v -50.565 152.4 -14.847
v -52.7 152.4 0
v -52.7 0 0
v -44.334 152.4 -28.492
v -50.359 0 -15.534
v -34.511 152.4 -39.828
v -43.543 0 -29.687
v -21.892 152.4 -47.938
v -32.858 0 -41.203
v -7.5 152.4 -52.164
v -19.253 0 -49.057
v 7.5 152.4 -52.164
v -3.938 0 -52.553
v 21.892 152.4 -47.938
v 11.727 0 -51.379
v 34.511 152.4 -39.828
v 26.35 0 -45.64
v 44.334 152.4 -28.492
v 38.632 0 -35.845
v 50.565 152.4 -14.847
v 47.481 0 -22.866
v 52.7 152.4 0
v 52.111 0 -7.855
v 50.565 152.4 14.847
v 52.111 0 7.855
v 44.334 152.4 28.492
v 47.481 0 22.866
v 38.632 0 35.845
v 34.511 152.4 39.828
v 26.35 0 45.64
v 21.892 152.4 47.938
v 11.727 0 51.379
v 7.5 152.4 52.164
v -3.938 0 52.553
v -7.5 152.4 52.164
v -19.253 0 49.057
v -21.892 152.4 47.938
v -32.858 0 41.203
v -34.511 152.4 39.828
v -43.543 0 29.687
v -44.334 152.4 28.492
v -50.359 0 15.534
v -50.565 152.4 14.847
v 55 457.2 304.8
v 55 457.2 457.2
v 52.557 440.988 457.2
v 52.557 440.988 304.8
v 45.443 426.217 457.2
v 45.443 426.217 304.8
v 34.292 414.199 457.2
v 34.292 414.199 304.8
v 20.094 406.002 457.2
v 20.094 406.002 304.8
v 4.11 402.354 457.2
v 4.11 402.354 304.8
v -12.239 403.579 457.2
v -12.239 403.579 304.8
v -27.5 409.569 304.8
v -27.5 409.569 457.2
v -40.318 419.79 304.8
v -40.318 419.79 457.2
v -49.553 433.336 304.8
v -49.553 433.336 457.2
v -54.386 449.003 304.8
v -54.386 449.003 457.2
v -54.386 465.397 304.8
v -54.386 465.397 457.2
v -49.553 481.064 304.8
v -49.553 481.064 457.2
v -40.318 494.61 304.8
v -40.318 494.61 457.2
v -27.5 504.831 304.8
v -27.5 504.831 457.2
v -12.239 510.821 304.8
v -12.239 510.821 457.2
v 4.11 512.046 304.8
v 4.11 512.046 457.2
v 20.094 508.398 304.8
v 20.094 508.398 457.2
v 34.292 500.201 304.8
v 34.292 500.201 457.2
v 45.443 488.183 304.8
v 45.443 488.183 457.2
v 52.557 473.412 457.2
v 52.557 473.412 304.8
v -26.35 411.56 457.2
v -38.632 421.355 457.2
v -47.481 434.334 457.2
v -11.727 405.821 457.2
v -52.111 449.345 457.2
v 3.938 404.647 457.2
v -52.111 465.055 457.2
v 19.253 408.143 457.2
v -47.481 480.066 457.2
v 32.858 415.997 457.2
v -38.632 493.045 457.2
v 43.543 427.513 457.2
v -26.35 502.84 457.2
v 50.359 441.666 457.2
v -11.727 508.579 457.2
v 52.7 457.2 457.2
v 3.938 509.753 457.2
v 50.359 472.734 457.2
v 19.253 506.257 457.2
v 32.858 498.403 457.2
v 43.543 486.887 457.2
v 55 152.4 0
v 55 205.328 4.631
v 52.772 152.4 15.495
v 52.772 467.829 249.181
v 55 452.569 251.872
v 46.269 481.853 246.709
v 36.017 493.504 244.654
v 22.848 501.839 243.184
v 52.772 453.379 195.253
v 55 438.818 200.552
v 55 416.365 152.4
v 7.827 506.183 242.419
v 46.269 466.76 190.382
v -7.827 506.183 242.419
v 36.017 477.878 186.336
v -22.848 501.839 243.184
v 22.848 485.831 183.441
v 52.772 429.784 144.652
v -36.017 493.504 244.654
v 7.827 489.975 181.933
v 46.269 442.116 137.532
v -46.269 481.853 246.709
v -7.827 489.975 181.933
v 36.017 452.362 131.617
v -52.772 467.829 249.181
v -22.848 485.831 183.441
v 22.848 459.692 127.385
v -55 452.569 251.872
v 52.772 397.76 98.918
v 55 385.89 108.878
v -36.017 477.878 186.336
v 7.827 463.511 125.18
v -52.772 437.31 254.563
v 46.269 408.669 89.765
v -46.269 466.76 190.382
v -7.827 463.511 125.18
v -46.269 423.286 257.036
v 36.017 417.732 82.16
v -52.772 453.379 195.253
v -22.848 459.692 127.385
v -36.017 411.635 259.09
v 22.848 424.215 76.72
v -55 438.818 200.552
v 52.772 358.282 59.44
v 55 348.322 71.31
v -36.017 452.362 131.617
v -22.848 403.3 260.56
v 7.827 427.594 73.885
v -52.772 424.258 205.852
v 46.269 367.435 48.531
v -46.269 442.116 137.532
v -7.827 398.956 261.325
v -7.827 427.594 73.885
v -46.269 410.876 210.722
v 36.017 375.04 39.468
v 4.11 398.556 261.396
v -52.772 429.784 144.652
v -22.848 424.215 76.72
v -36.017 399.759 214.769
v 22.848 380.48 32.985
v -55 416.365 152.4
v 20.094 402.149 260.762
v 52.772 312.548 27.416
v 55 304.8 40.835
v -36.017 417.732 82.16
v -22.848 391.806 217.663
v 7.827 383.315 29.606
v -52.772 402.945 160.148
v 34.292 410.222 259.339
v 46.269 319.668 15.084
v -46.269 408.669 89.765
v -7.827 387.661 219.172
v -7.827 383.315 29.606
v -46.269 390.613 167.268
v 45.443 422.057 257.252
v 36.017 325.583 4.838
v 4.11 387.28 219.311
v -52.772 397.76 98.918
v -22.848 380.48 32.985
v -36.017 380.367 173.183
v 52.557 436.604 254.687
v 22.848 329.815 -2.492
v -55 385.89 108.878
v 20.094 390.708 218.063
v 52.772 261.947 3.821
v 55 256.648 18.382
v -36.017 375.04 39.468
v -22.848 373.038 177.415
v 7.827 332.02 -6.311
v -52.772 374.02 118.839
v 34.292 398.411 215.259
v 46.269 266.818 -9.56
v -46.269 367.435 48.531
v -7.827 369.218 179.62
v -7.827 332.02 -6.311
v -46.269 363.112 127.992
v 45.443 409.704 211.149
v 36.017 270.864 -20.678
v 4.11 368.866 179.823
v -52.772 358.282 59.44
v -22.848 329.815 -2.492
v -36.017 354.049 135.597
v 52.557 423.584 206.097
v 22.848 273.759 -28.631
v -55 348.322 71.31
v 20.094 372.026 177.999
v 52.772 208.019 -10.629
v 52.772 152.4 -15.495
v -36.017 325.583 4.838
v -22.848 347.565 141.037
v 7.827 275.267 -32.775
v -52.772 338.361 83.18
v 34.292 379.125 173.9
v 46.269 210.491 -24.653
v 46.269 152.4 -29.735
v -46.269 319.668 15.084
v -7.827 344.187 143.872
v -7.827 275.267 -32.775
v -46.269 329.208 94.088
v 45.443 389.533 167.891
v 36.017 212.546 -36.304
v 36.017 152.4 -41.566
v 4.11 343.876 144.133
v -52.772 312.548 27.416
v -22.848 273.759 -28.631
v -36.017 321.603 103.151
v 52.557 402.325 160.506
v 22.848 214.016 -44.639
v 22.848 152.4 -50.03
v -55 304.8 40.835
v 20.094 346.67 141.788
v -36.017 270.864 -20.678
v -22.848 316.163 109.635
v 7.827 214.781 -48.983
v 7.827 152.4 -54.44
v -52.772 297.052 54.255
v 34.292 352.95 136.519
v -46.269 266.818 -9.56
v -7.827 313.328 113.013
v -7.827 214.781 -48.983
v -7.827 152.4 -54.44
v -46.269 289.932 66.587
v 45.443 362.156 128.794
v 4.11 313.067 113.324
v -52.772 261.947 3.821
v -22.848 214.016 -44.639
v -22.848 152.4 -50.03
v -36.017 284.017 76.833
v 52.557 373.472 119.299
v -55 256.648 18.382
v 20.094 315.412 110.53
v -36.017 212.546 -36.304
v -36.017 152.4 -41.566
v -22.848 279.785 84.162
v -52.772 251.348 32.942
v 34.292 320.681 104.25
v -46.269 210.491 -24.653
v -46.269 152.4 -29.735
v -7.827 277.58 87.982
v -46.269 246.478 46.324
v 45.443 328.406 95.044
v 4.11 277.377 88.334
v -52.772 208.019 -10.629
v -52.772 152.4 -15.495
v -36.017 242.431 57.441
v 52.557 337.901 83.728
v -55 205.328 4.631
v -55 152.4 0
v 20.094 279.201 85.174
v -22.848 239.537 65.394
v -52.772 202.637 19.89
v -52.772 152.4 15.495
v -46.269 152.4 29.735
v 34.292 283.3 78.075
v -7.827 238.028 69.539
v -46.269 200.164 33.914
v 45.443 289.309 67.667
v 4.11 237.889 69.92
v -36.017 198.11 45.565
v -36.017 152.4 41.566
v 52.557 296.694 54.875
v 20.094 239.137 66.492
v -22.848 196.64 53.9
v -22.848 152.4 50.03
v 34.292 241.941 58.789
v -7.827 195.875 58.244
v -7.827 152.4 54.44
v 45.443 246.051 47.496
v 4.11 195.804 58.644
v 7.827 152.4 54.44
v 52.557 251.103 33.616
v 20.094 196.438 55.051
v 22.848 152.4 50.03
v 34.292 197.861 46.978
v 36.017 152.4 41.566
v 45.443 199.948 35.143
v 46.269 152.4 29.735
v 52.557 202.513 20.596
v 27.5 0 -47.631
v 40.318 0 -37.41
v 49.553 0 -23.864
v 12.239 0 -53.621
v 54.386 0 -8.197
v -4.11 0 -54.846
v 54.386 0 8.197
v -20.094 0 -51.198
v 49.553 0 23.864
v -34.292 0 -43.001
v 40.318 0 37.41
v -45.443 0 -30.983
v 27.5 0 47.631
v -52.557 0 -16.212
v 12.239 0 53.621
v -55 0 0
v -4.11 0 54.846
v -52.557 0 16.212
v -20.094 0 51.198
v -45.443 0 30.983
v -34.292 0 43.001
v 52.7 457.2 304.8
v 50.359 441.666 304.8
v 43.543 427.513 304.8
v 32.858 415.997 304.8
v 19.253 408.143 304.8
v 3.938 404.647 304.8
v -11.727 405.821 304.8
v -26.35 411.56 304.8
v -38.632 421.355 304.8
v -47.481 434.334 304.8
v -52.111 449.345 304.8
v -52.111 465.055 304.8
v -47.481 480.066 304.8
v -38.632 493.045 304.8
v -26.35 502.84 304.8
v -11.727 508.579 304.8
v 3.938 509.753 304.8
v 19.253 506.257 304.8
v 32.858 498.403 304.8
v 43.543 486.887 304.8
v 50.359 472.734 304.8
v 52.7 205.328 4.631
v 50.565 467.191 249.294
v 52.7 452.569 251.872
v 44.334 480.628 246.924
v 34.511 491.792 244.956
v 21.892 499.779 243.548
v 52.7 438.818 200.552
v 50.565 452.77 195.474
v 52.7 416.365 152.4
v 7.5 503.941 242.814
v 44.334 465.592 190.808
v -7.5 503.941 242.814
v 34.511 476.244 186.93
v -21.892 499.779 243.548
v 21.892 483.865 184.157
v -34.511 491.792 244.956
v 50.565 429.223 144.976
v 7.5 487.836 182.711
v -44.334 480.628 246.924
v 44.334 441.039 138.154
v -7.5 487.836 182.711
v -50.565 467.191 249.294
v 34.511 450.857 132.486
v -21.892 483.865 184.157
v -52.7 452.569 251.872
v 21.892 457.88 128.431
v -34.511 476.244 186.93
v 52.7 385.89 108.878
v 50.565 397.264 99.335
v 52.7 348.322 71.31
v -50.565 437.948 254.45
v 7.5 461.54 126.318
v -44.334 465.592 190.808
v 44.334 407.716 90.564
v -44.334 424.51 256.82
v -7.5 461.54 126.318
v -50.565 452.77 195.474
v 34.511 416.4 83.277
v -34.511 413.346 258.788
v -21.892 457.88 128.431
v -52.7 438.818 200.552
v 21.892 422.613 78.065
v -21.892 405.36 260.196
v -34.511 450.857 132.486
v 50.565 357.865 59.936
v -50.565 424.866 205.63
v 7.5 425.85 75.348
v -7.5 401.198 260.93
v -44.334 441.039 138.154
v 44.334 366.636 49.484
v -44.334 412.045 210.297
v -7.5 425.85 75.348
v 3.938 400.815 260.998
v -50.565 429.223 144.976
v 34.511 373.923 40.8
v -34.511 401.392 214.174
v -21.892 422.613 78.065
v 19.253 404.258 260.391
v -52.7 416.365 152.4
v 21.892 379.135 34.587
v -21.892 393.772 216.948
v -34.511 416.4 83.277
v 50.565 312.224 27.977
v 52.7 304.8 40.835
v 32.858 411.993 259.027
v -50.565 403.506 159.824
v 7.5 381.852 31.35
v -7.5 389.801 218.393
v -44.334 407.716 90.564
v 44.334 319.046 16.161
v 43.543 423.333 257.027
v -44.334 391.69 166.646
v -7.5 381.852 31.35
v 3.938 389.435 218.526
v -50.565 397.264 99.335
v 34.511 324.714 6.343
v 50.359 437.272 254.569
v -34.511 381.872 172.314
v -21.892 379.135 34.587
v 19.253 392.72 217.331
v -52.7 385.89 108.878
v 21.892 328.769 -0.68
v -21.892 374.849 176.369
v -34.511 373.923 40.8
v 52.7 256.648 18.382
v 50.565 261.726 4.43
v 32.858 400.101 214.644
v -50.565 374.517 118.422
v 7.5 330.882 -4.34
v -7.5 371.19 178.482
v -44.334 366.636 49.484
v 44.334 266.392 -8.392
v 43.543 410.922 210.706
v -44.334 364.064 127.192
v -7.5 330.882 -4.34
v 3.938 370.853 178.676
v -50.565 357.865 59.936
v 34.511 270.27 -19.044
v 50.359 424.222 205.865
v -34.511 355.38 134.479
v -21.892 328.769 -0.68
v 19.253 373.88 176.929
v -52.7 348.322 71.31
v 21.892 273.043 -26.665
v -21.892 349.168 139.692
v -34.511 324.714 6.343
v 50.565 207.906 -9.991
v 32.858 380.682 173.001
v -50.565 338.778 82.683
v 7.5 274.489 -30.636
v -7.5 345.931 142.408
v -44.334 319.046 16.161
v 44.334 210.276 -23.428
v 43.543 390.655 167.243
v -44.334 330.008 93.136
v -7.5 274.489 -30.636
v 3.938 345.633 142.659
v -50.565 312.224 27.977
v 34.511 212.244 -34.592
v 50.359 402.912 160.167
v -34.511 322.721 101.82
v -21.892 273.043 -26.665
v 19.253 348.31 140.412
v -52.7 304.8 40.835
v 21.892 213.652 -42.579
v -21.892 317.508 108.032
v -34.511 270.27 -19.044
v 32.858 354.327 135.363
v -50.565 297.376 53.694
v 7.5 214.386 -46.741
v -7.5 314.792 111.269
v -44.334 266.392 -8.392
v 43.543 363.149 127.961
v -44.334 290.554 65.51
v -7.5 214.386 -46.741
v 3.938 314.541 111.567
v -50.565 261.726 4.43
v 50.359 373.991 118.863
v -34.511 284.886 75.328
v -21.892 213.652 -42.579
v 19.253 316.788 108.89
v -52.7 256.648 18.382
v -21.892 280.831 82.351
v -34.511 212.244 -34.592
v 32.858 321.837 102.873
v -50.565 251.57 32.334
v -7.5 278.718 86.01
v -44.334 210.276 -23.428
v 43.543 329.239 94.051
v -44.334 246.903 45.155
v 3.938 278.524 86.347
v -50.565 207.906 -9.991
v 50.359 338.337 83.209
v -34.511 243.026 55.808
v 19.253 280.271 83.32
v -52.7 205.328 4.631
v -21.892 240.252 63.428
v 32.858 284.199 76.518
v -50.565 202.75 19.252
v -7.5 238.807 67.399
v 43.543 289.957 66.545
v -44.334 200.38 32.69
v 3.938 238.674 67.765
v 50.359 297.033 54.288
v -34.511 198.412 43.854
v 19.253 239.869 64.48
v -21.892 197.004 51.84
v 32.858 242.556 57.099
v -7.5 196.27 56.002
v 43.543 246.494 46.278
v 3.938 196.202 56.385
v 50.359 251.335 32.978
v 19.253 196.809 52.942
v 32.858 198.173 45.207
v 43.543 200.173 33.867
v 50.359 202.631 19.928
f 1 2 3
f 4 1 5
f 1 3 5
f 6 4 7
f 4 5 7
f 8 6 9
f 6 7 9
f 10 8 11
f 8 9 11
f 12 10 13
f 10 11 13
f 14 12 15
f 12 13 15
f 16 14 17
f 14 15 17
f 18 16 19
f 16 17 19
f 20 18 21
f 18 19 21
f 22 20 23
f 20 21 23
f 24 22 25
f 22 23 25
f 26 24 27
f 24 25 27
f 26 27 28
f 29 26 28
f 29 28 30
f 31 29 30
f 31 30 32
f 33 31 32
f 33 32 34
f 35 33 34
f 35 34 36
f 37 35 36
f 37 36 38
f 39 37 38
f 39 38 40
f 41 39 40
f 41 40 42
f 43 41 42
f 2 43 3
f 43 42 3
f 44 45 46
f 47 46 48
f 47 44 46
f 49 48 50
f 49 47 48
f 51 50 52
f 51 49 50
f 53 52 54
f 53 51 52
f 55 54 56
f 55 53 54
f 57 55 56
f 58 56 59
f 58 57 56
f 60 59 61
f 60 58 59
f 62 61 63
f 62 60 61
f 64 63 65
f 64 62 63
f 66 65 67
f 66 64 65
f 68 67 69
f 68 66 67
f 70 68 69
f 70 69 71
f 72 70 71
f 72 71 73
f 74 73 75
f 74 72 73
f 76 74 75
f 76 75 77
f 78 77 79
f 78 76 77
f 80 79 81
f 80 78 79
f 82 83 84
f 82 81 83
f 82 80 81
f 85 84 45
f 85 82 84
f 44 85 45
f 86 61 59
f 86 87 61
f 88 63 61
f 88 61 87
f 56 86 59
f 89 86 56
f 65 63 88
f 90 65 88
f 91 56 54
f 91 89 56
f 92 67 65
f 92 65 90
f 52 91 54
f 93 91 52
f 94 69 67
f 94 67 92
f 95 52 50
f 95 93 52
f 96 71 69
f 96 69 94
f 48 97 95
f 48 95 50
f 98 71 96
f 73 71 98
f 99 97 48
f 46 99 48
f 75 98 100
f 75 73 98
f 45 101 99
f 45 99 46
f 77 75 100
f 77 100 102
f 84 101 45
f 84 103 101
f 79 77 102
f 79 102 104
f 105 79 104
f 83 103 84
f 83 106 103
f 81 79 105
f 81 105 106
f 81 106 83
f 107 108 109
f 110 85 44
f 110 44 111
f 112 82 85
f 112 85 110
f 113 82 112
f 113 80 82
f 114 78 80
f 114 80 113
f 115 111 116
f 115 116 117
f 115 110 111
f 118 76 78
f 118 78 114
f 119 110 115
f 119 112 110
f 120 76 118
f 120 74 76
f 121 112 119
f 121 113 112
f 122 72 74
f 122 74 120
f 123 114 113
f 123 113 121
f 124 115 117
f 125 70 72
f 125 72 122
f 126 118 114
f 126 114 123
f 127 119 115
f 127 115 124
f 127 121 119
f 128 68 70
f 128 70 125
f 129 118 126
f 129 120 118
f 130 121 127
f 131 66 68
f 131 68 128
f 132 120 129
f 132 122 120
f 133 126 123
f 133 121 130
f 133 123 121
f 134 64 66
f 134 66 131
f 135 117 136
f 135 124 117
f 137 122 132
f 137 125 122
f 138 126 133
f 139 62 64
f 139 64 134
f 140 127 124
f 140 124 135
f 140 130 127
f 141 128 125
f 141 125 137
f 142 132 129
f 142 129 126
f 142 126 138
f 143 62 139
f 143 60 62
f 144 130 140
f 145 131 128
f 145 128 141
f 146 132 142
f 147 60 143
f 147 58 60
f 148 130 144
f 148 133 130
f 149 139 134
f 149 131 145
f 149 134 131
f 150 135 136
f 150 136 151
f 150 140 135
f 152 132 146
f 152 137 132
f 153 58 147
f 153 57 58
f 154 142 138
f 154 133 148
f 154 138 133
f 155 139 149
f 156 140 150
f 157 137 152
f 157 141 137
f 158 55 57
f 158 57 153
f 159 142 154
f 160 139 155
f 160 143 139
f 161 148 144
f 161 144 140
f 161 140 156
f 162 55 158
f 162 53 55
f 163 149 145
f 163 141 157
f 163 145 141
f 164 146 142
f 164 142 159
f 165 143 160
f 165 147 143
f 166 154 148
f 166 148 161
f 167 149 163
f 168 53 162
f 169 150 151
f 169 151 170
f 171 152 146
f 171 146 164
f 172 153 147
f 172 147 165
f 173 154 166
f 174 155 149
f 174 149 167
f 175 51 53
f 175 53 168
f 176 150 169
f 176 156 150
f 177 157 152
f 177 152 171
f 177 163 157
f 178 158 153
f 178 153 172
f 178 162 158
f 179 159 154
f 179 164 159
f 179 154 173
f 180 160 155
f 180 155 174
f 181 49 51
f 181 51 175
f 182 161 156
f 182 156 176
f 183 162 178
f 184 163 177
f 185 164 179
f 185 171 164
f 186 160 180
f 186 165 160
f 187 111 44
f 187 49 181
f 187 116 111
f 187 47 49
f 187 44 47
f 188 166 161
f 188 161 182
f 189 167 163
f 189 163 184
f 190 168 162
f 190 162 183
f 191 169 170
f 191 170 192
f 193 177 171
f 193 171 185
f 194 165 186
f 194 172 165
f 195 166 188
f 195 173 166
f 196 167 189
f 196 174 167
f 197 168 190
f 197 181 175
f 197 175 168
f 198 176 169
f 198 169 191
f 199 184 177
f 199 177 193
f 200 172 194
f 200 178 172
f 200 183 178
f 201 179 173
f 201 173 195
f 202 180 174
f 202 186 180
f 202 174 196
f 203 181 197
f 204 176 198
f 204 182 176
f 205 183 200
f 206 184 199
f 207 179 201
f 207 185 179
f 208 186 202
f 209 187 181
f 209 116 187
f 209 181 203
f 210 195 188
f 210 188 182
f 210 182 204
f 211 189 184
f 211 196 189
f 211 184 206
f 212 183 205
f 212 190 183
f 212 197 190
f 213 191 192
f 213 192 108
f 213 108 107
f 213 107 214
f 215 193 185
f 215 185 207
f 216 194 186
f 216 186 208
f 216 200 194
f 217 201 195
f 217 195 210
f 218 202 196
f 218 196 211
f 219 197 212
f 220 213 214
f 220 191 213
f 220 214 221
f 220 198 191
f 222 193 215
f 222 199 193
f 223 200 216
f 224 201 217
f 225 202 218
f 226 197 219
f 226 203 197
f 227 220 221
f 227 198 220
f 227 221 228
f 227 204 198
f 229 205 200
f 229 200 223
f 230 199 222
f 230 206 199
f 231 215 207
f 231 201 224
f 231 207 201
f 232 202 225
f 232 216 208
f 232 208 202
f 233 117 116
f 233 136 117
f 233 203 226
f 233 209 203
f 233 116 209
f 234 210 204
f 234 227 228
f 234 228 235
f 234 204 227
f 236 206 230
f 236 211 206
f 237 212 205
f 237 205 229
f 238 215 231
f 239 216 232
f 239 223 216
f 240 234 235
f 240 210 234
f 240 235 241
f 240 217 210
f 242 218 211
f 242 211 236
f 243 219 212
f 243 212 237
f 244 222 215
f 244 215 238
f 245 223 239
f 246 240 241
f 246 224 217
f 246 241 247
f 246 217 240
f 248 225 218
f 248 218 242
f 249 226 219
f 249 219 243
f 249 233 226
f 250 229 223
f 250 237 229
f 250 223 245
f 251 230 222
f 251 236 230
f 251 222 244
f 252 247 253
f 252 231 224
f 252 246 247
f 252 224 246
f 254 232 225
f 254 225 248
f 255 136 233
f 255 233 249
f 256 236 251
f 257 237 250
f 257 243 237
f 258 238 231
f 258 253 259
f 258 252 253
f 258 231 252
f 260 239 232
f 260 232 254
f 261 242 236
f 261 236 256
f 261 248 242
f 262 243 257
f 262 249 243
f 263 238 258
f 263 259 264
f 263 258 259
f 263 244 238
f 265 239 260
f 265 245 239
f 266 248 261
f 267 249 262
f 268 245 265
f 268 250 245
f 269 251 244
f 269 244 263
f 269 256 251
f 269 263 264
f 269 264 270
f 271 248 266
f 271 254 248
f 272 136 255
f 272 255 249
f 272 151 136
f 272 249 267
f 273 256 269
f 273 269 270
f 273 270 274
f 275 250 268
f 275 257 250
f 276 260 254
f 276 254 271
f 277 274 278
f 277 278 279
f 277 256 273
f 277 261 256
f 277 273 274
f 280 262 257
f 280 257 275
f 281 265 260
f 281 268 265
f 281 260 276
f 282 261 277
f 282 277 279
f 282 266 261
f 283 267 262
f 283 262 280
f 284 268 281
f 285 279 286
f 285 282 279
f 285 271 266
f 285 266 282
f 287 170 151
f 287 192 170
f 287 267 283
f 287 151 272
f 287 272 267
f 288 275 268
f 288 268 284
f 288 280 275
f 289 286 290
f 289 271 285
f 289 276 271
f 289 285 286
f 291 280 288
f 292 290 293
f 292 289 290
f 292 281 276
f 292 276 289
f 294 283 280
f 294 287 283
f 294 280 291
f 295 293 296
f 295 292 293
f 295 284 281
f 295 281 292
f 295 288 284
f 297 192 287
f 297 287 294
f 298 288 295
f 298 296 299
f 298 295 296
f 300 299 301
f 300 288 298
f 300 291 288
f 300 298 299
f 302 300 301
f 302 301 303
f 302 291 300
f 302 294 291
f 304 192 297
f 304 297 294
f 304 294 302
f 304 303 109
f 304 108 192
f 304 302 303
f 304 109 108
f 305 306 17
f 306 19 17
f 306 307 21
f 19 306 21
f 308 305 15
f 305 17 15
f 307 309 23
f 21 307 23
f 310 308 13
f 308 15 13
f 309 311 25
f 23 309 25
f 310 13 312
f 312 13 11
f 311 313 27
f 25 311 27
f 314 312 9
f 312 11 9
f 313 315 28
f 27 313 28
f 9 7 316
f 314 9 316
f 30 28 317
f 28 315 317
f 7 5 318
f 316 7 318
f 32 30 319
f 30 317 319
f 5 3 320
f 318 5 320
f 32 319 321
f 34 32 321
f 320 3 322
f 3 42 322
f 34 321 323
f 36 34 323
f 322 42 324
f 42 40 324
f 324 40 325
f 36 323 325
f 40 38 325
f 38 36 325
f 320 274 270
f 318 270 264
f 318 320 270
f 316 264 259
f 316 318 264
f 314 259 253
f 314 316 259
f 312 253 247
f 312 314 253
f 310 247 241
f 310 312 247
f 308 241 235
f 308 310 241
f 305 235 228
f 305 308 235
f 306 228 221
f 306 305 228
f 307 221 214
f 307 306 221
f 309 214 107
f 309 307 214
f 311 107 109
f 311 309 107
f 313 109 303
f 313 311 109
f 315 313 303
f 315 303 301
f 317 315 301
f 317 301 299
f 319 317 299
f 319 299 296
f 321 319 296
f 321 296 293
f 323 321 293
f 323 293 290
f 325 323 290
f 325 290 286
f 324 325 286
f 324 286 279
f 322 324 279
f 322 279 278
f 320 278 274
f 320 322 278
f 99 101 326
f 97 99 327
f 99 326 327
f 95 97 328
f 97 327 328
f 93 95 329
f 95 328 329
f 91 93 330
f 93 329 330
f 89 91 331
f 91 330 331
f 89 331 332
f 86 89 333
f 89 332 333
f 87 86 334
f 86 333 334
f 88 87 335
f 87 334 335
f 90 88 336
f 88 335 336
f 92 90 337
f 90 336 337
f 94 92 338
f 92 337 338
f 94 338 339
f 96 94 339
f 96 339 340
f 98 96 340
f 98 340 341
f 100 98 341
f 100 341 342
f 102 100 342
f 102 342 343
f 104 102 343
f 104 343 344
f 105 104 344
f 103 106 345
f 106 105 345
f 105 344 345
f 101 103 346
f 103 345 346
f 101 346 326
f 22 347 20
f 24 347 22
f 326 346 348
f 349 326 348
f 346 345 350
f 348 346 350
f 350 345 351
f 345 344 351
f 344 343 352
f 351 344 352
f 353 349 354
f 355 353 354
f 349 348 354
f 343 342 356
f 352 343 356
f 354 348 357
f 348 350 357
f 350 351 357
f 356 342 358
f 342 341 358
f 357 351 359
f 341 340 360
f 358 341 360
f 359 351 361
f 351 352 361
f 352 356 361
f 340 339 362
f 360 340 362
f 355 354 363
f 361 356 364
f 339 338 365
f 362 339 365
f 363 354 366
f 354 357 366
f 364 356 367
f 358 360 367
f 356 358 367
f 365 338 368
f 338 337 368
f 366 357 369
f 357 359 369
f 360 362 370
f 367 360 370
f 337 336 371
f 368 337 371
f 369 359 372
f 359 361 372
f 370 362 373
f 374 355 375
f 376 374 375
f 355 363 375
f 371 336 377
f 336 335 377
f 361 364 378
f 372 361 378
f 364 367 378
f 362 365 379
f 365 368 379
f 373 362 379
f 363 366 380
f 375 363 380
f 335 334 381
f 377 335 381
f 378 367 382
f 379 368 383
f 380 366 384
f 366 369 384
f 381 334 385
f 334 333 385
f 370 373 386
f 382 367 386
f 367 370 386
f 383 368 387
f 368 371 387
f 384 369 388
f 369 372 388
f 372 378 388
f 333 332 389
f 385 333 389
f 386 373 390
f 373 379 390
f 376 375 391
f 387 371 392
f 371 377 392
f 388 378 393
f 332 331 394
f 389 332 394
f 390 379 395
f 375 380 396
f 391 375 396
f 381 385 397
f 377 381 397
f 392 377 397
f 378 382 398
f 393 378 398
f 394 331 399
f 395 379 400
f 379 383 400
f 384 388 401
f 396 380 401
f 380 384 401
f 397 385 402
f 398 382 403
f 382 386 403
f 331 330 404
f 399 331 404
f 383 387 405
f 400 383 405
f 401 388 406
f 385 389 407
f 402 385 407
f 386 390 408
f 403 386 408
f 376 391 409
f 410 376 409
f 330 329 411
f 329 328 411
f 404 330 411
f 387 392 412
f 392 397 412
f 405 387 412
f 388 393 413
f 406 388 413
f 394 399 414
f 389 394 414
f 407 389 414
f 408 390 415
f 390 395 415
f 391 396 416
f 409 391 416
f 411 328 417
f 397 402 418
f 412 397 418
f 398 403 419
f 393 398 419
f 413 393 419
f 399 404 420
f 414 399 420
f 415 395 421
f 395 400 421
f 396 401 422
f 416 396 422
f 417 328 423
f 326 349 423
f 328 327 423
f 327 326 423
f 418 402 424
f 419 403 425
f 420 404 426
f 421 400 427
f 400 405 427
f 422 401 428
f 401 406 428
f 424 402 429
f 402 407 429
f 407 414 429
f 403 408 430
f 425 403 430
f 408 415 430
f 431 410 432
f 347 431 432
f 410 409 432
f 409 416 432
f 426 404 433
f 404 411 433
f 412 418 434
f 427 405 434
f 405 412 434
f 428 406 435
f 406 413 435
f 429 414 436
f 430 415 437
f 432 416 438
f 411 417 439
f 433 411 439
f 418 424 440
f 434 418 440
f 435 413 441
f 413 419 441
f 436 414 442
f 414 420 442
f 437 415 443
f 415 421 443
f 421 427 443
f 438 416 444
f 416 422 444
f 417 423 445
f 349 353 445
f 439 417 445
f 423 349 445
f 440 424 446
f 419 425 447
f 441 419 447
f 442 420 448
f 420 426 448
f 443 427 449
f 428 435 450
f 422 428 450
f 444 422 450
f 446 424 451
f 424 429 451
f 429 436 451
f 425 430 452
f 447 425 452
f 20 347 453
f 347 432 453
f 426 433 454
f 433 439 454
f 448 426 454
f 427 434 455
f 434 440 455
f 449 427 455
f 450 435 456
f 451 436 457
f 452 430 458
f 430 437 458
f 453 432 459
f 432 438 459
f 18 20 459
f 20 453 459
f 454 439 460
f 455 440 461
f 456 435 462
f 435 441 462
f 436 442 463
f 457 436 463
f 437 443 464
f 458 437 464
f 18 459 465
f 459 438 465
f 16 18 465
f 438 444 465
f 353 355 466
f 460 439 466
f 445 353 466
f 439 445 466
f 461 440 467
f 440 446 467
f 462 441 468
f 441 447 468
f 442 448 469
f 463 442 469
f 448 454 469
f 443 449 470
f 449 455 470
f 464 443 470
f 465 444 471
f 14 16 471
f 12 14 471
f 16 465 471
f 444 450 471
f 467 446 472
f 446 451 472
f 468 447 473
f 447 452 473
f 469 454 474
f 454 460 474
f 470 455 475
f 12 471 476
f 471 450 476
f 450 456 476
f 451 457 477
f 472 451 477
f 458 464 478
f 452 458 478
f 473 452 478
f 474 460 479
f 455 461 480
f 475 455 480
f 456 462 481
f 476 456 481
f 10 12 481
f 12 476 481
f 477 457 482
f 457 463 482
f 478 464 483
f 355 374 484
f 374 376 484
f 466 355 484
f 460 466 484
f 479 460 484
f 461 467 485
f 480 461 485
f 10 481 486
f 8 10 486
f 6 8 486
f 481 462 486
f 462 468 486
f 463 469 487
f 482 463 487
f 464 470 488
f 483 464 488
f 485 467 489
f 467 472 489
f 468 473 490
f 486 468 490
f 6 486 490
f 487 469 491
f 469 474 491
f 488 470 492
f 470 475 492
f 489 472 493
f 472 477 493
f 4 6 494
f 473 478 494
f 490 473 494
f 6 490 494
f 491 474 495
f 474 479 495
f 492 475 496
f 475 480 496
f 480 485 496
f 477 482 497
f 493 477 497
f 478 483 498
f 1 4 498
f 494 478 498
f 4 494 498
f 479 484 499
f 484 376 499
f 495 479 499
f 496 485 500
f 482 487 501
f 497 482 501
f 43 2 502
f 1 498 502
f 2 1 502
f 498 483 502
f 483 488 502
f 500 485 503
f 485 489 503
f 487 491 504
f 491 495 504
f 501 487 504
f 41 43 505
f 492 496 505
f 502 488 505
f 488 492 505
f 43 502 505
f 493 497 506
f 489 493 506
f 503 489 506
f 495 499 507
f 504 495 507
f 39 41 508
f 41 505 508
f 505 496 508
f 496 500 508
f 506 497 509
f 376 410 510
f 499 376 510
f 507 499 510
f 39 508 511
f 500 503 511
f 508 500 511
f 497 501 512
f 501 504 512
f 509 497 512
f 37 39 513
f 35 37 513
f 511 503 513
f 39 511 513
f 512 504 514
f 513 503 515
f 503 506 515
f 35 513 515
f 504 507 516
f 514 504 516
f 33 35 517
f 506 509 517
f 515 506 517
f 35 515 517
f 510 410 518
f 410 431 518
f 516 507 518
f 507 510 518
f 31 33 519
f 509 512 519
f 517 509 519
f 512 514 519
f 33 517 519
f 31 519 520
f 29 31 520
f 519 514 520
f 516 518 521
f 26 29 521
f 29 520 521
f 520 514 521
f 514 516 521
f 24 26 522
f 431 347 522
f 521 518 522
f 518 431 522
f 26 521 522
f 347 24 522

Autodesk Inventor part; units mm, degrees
ref_plane "YZ Plane" through (0, 0, 0) normal (1, 0, 0) x (0, 1, 0)
ref_plane "XZ Plane" through (0, 0, 0) normal (0, 1, 0) x (-1, 0, 0)
sketch "Sketch1" plane through (0, 0, 0) normal (0, 1, 0) x (-1, 0, 0)
  circle A0 centre (0, 0) radius 55
  circle A1 centre (0, 0) radius 52.7
  dimension "d0" = 110
  dimension "d1" = 2.3
extrude "Extrusion1" add sketch "Sketch1" along normal blind 152.4
sketch "Sketch4" plane through (0, 152.4, 0) normal (0, 1, 0) x (1, 0, 0)
  circle A0 centre (0, 0) radius 52.7 projected
  circle A1 centre (0, 0) radius 55 projected
  point P0 (-55, 0)
ref_plane "Work Plane4" through (-55, 152.4, 0) normal (-1, 0, 0) x (0, -1, 0)
sketch "Sketch8" plane through (-55, 152.4, 0) normal (-1, 0, 0) x (0, -1, 0)
  line L0 (0, 0) -> (0, 304.8) construction
  arc A0 (-304.8, 304.8) -> (0, 0) centre (0, 304.8) ccw
  line L1 (0, 304.8) -> (-304.8, 304.8) construction
  point P0 (152.4, 0)
  dimension "d7" = 304.8
sweep "Sweep1" add profiles "Sketch4" path "Sketch8"
sketch "Sketch9" plane through (0, 457.2, 304.8) normal (0, 0, 1) x (1, 0, 0)
  circle A0 centre (0, 0) radius 52.7 projected
  circle A1 centre (0, 0) radius 55 projected
  point P0 (0, -457.2)
extrude "Extrusion2" add sketch "Sketch9" along normal blind 152.4
properties part number "sweep"
